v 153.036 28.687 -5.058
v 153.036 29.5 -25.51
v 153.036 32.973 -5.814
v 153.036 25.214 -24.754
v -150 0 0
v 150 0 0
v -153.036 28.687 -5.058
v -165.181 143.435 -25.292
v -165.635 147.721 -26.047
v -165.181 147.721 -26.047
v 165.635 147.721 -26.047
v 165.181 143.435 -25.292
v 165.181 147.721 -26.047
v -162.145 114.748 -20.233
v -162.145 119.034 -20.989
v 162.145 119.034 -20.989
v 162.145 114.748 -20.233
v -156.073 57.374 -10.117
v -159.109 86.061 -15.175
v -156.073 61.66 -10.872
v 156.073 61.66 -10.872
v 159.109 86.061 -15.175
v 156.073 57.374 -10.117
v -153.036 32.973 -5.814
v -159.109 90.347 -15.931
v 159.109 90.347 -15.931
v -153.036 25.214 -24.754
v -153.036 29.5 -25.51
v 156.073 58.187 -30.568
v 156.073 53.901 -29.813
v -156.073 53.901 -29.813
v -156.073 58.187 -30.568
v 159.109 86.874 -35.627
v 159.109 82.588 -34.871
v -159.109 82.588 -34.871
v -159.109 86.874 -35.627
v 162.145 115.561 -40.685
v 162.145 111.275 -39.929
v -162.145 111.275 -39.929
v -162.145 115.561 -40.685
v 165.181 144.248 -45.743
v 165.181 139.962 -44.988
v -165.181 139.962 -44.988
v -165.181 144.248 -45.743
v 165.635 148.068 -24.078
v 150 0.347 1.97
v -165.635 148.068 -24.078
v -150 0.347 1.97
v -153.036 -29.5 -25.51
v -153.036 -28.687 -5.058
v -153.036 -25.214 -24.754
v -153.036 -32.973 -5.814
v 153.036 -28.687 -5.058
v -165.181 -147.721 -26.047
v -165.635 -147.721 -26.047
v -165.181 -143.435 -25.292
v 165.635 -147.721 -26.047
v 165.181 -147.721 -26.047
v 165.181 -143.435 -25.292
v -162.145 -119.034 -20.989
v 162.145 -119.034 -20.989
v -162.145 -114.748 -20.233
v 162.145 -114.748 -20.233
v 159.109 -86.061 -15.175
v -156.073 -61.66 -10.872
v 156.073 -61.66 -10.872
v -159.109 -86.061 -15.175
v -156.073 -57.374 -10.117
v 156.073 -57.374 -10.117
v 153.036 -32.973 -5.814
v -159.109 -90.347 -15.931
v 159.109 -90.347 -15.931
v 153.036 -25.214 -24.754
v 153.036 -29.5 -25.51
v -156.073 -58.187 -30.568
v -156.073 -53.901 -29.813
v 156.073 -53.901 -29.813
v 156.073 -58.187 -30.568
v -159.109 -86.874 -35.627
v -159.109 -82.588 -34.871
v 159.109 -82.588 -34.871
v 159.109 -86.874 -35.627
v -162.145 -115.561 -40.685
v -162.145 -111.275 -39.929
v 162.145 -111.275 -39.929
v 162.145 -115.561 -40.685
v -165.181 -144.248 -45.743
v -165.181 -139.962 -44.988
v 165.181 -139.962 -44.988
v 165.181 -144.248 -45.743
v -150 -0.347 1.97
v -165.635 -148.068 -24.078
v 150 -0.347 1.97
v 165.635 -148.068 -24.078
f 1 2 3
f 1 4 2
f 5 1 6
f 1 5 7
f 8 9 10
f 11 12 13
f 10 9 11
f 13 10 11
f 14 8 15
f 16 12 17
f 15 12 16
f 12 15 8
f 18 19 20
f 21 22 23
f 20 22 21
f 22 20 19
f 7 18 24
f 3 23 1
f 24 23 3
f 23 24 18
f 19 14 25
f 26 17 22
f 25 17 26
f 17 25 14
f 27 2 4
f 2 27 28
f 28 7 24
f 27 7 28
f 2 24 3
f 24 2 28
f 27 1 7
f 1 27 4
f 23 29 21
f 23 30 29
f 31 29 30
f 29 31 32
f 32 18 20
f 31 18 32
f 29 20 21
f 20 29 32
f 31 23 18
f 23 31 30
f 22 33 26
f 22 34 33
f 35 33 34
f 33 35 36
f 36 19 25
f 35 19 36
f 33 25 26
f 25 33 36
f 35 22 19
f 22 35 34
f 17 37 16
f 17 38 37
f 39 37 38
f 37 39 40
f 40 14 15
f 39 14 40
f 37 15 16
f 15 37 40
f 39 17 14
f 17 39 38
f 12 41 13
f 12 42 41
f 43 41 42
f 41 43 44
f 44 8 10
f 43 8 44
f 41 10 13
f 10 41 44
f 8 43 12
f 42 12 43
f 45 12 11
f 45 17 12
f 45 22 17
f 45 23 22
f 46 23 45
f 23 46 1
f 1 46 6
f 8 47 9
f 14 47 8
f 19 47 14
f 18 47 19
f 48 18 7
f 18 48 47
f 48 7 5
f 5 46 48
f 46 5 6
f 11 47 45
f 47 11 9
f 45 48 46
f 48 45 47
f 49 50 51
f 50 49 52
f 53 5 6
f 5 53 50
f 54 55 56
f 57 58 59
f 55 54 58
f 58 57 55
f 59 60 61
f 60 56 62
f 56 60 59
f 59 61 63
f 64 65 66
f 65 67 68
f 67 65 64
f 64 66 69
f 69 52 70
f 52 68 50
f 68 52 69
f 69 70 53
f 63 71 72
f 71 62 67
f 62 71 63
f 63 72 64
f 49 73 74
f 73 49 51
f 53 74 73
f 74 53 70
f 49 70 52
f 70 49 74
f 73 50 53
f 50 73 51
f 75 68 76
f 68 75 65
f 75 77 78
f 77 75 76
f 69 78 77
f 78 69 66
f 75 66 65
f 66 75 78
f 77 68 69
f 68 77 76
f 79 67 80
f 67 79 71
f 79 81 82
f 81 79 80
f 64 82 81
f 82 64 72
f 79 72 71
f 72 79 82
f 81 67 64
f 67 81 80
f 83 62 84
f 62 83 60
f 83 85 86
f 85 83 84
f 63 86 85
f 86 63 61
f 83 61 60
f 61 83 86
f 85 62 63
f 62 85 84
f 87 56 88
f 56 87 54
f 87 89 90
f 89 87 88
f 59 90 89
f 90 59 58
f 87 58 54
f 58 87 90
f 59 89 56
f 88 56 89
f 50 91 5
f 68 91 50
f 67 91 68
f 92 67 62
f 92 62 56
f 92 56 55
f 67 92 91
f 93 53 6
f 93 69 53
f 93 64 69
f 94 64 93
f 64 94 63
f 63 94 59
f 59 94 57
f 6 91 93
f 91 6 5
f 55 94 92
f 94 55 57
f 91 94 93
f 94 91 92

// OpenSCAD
// file: quarter.scad
module quarter(top_w = 300, bottom_w=500, l=150) 
{
    metal_thickness = 2;
    n_horizontal_beams = 5;
    horizontal_beam_w = 1.7 * 2.56;
    horizontal_beam_h = 20;
    
    points = [[-top_w/2, 0], [top_w/2, 0], [bottom_w/2, l], [-bottom_w/2, l]];
    
    linear_extrude(height = metal_thickness, center = false)
        polygon(points, convexity = 1);
    
    mystep = (l-horizontal_beam_w)/n_horizontal_beams;
    coeff = (bottom_w-top_w)/l;
    for (x = [mystep:mystep:l]) {
        translate([0,x+horizontal_beam_w/2,-horizontal_beam_h/2])
            cube([top_w+x*coeff, horizontal_beam_w, horizontal_beam_h], center=true);
     }
    
}

quarter();
// main file
use <quarter.scad> 

module extraroof(w = 300, l=150, long_angle=10, short_angle=30) 
{
    hh = l * sin(long_angle);
    short_l = hh/cos(short_angle);
    long_extend = short_l * sin(long_angle) + hh;
    rotate([-long_angle,0,0]) {
        quarter(w, w+long_extend, l);
    }
    rotate([-long_angle,0,180]) {
        quarter(w, w+long_extend, l);
    }
}

extraroof();
